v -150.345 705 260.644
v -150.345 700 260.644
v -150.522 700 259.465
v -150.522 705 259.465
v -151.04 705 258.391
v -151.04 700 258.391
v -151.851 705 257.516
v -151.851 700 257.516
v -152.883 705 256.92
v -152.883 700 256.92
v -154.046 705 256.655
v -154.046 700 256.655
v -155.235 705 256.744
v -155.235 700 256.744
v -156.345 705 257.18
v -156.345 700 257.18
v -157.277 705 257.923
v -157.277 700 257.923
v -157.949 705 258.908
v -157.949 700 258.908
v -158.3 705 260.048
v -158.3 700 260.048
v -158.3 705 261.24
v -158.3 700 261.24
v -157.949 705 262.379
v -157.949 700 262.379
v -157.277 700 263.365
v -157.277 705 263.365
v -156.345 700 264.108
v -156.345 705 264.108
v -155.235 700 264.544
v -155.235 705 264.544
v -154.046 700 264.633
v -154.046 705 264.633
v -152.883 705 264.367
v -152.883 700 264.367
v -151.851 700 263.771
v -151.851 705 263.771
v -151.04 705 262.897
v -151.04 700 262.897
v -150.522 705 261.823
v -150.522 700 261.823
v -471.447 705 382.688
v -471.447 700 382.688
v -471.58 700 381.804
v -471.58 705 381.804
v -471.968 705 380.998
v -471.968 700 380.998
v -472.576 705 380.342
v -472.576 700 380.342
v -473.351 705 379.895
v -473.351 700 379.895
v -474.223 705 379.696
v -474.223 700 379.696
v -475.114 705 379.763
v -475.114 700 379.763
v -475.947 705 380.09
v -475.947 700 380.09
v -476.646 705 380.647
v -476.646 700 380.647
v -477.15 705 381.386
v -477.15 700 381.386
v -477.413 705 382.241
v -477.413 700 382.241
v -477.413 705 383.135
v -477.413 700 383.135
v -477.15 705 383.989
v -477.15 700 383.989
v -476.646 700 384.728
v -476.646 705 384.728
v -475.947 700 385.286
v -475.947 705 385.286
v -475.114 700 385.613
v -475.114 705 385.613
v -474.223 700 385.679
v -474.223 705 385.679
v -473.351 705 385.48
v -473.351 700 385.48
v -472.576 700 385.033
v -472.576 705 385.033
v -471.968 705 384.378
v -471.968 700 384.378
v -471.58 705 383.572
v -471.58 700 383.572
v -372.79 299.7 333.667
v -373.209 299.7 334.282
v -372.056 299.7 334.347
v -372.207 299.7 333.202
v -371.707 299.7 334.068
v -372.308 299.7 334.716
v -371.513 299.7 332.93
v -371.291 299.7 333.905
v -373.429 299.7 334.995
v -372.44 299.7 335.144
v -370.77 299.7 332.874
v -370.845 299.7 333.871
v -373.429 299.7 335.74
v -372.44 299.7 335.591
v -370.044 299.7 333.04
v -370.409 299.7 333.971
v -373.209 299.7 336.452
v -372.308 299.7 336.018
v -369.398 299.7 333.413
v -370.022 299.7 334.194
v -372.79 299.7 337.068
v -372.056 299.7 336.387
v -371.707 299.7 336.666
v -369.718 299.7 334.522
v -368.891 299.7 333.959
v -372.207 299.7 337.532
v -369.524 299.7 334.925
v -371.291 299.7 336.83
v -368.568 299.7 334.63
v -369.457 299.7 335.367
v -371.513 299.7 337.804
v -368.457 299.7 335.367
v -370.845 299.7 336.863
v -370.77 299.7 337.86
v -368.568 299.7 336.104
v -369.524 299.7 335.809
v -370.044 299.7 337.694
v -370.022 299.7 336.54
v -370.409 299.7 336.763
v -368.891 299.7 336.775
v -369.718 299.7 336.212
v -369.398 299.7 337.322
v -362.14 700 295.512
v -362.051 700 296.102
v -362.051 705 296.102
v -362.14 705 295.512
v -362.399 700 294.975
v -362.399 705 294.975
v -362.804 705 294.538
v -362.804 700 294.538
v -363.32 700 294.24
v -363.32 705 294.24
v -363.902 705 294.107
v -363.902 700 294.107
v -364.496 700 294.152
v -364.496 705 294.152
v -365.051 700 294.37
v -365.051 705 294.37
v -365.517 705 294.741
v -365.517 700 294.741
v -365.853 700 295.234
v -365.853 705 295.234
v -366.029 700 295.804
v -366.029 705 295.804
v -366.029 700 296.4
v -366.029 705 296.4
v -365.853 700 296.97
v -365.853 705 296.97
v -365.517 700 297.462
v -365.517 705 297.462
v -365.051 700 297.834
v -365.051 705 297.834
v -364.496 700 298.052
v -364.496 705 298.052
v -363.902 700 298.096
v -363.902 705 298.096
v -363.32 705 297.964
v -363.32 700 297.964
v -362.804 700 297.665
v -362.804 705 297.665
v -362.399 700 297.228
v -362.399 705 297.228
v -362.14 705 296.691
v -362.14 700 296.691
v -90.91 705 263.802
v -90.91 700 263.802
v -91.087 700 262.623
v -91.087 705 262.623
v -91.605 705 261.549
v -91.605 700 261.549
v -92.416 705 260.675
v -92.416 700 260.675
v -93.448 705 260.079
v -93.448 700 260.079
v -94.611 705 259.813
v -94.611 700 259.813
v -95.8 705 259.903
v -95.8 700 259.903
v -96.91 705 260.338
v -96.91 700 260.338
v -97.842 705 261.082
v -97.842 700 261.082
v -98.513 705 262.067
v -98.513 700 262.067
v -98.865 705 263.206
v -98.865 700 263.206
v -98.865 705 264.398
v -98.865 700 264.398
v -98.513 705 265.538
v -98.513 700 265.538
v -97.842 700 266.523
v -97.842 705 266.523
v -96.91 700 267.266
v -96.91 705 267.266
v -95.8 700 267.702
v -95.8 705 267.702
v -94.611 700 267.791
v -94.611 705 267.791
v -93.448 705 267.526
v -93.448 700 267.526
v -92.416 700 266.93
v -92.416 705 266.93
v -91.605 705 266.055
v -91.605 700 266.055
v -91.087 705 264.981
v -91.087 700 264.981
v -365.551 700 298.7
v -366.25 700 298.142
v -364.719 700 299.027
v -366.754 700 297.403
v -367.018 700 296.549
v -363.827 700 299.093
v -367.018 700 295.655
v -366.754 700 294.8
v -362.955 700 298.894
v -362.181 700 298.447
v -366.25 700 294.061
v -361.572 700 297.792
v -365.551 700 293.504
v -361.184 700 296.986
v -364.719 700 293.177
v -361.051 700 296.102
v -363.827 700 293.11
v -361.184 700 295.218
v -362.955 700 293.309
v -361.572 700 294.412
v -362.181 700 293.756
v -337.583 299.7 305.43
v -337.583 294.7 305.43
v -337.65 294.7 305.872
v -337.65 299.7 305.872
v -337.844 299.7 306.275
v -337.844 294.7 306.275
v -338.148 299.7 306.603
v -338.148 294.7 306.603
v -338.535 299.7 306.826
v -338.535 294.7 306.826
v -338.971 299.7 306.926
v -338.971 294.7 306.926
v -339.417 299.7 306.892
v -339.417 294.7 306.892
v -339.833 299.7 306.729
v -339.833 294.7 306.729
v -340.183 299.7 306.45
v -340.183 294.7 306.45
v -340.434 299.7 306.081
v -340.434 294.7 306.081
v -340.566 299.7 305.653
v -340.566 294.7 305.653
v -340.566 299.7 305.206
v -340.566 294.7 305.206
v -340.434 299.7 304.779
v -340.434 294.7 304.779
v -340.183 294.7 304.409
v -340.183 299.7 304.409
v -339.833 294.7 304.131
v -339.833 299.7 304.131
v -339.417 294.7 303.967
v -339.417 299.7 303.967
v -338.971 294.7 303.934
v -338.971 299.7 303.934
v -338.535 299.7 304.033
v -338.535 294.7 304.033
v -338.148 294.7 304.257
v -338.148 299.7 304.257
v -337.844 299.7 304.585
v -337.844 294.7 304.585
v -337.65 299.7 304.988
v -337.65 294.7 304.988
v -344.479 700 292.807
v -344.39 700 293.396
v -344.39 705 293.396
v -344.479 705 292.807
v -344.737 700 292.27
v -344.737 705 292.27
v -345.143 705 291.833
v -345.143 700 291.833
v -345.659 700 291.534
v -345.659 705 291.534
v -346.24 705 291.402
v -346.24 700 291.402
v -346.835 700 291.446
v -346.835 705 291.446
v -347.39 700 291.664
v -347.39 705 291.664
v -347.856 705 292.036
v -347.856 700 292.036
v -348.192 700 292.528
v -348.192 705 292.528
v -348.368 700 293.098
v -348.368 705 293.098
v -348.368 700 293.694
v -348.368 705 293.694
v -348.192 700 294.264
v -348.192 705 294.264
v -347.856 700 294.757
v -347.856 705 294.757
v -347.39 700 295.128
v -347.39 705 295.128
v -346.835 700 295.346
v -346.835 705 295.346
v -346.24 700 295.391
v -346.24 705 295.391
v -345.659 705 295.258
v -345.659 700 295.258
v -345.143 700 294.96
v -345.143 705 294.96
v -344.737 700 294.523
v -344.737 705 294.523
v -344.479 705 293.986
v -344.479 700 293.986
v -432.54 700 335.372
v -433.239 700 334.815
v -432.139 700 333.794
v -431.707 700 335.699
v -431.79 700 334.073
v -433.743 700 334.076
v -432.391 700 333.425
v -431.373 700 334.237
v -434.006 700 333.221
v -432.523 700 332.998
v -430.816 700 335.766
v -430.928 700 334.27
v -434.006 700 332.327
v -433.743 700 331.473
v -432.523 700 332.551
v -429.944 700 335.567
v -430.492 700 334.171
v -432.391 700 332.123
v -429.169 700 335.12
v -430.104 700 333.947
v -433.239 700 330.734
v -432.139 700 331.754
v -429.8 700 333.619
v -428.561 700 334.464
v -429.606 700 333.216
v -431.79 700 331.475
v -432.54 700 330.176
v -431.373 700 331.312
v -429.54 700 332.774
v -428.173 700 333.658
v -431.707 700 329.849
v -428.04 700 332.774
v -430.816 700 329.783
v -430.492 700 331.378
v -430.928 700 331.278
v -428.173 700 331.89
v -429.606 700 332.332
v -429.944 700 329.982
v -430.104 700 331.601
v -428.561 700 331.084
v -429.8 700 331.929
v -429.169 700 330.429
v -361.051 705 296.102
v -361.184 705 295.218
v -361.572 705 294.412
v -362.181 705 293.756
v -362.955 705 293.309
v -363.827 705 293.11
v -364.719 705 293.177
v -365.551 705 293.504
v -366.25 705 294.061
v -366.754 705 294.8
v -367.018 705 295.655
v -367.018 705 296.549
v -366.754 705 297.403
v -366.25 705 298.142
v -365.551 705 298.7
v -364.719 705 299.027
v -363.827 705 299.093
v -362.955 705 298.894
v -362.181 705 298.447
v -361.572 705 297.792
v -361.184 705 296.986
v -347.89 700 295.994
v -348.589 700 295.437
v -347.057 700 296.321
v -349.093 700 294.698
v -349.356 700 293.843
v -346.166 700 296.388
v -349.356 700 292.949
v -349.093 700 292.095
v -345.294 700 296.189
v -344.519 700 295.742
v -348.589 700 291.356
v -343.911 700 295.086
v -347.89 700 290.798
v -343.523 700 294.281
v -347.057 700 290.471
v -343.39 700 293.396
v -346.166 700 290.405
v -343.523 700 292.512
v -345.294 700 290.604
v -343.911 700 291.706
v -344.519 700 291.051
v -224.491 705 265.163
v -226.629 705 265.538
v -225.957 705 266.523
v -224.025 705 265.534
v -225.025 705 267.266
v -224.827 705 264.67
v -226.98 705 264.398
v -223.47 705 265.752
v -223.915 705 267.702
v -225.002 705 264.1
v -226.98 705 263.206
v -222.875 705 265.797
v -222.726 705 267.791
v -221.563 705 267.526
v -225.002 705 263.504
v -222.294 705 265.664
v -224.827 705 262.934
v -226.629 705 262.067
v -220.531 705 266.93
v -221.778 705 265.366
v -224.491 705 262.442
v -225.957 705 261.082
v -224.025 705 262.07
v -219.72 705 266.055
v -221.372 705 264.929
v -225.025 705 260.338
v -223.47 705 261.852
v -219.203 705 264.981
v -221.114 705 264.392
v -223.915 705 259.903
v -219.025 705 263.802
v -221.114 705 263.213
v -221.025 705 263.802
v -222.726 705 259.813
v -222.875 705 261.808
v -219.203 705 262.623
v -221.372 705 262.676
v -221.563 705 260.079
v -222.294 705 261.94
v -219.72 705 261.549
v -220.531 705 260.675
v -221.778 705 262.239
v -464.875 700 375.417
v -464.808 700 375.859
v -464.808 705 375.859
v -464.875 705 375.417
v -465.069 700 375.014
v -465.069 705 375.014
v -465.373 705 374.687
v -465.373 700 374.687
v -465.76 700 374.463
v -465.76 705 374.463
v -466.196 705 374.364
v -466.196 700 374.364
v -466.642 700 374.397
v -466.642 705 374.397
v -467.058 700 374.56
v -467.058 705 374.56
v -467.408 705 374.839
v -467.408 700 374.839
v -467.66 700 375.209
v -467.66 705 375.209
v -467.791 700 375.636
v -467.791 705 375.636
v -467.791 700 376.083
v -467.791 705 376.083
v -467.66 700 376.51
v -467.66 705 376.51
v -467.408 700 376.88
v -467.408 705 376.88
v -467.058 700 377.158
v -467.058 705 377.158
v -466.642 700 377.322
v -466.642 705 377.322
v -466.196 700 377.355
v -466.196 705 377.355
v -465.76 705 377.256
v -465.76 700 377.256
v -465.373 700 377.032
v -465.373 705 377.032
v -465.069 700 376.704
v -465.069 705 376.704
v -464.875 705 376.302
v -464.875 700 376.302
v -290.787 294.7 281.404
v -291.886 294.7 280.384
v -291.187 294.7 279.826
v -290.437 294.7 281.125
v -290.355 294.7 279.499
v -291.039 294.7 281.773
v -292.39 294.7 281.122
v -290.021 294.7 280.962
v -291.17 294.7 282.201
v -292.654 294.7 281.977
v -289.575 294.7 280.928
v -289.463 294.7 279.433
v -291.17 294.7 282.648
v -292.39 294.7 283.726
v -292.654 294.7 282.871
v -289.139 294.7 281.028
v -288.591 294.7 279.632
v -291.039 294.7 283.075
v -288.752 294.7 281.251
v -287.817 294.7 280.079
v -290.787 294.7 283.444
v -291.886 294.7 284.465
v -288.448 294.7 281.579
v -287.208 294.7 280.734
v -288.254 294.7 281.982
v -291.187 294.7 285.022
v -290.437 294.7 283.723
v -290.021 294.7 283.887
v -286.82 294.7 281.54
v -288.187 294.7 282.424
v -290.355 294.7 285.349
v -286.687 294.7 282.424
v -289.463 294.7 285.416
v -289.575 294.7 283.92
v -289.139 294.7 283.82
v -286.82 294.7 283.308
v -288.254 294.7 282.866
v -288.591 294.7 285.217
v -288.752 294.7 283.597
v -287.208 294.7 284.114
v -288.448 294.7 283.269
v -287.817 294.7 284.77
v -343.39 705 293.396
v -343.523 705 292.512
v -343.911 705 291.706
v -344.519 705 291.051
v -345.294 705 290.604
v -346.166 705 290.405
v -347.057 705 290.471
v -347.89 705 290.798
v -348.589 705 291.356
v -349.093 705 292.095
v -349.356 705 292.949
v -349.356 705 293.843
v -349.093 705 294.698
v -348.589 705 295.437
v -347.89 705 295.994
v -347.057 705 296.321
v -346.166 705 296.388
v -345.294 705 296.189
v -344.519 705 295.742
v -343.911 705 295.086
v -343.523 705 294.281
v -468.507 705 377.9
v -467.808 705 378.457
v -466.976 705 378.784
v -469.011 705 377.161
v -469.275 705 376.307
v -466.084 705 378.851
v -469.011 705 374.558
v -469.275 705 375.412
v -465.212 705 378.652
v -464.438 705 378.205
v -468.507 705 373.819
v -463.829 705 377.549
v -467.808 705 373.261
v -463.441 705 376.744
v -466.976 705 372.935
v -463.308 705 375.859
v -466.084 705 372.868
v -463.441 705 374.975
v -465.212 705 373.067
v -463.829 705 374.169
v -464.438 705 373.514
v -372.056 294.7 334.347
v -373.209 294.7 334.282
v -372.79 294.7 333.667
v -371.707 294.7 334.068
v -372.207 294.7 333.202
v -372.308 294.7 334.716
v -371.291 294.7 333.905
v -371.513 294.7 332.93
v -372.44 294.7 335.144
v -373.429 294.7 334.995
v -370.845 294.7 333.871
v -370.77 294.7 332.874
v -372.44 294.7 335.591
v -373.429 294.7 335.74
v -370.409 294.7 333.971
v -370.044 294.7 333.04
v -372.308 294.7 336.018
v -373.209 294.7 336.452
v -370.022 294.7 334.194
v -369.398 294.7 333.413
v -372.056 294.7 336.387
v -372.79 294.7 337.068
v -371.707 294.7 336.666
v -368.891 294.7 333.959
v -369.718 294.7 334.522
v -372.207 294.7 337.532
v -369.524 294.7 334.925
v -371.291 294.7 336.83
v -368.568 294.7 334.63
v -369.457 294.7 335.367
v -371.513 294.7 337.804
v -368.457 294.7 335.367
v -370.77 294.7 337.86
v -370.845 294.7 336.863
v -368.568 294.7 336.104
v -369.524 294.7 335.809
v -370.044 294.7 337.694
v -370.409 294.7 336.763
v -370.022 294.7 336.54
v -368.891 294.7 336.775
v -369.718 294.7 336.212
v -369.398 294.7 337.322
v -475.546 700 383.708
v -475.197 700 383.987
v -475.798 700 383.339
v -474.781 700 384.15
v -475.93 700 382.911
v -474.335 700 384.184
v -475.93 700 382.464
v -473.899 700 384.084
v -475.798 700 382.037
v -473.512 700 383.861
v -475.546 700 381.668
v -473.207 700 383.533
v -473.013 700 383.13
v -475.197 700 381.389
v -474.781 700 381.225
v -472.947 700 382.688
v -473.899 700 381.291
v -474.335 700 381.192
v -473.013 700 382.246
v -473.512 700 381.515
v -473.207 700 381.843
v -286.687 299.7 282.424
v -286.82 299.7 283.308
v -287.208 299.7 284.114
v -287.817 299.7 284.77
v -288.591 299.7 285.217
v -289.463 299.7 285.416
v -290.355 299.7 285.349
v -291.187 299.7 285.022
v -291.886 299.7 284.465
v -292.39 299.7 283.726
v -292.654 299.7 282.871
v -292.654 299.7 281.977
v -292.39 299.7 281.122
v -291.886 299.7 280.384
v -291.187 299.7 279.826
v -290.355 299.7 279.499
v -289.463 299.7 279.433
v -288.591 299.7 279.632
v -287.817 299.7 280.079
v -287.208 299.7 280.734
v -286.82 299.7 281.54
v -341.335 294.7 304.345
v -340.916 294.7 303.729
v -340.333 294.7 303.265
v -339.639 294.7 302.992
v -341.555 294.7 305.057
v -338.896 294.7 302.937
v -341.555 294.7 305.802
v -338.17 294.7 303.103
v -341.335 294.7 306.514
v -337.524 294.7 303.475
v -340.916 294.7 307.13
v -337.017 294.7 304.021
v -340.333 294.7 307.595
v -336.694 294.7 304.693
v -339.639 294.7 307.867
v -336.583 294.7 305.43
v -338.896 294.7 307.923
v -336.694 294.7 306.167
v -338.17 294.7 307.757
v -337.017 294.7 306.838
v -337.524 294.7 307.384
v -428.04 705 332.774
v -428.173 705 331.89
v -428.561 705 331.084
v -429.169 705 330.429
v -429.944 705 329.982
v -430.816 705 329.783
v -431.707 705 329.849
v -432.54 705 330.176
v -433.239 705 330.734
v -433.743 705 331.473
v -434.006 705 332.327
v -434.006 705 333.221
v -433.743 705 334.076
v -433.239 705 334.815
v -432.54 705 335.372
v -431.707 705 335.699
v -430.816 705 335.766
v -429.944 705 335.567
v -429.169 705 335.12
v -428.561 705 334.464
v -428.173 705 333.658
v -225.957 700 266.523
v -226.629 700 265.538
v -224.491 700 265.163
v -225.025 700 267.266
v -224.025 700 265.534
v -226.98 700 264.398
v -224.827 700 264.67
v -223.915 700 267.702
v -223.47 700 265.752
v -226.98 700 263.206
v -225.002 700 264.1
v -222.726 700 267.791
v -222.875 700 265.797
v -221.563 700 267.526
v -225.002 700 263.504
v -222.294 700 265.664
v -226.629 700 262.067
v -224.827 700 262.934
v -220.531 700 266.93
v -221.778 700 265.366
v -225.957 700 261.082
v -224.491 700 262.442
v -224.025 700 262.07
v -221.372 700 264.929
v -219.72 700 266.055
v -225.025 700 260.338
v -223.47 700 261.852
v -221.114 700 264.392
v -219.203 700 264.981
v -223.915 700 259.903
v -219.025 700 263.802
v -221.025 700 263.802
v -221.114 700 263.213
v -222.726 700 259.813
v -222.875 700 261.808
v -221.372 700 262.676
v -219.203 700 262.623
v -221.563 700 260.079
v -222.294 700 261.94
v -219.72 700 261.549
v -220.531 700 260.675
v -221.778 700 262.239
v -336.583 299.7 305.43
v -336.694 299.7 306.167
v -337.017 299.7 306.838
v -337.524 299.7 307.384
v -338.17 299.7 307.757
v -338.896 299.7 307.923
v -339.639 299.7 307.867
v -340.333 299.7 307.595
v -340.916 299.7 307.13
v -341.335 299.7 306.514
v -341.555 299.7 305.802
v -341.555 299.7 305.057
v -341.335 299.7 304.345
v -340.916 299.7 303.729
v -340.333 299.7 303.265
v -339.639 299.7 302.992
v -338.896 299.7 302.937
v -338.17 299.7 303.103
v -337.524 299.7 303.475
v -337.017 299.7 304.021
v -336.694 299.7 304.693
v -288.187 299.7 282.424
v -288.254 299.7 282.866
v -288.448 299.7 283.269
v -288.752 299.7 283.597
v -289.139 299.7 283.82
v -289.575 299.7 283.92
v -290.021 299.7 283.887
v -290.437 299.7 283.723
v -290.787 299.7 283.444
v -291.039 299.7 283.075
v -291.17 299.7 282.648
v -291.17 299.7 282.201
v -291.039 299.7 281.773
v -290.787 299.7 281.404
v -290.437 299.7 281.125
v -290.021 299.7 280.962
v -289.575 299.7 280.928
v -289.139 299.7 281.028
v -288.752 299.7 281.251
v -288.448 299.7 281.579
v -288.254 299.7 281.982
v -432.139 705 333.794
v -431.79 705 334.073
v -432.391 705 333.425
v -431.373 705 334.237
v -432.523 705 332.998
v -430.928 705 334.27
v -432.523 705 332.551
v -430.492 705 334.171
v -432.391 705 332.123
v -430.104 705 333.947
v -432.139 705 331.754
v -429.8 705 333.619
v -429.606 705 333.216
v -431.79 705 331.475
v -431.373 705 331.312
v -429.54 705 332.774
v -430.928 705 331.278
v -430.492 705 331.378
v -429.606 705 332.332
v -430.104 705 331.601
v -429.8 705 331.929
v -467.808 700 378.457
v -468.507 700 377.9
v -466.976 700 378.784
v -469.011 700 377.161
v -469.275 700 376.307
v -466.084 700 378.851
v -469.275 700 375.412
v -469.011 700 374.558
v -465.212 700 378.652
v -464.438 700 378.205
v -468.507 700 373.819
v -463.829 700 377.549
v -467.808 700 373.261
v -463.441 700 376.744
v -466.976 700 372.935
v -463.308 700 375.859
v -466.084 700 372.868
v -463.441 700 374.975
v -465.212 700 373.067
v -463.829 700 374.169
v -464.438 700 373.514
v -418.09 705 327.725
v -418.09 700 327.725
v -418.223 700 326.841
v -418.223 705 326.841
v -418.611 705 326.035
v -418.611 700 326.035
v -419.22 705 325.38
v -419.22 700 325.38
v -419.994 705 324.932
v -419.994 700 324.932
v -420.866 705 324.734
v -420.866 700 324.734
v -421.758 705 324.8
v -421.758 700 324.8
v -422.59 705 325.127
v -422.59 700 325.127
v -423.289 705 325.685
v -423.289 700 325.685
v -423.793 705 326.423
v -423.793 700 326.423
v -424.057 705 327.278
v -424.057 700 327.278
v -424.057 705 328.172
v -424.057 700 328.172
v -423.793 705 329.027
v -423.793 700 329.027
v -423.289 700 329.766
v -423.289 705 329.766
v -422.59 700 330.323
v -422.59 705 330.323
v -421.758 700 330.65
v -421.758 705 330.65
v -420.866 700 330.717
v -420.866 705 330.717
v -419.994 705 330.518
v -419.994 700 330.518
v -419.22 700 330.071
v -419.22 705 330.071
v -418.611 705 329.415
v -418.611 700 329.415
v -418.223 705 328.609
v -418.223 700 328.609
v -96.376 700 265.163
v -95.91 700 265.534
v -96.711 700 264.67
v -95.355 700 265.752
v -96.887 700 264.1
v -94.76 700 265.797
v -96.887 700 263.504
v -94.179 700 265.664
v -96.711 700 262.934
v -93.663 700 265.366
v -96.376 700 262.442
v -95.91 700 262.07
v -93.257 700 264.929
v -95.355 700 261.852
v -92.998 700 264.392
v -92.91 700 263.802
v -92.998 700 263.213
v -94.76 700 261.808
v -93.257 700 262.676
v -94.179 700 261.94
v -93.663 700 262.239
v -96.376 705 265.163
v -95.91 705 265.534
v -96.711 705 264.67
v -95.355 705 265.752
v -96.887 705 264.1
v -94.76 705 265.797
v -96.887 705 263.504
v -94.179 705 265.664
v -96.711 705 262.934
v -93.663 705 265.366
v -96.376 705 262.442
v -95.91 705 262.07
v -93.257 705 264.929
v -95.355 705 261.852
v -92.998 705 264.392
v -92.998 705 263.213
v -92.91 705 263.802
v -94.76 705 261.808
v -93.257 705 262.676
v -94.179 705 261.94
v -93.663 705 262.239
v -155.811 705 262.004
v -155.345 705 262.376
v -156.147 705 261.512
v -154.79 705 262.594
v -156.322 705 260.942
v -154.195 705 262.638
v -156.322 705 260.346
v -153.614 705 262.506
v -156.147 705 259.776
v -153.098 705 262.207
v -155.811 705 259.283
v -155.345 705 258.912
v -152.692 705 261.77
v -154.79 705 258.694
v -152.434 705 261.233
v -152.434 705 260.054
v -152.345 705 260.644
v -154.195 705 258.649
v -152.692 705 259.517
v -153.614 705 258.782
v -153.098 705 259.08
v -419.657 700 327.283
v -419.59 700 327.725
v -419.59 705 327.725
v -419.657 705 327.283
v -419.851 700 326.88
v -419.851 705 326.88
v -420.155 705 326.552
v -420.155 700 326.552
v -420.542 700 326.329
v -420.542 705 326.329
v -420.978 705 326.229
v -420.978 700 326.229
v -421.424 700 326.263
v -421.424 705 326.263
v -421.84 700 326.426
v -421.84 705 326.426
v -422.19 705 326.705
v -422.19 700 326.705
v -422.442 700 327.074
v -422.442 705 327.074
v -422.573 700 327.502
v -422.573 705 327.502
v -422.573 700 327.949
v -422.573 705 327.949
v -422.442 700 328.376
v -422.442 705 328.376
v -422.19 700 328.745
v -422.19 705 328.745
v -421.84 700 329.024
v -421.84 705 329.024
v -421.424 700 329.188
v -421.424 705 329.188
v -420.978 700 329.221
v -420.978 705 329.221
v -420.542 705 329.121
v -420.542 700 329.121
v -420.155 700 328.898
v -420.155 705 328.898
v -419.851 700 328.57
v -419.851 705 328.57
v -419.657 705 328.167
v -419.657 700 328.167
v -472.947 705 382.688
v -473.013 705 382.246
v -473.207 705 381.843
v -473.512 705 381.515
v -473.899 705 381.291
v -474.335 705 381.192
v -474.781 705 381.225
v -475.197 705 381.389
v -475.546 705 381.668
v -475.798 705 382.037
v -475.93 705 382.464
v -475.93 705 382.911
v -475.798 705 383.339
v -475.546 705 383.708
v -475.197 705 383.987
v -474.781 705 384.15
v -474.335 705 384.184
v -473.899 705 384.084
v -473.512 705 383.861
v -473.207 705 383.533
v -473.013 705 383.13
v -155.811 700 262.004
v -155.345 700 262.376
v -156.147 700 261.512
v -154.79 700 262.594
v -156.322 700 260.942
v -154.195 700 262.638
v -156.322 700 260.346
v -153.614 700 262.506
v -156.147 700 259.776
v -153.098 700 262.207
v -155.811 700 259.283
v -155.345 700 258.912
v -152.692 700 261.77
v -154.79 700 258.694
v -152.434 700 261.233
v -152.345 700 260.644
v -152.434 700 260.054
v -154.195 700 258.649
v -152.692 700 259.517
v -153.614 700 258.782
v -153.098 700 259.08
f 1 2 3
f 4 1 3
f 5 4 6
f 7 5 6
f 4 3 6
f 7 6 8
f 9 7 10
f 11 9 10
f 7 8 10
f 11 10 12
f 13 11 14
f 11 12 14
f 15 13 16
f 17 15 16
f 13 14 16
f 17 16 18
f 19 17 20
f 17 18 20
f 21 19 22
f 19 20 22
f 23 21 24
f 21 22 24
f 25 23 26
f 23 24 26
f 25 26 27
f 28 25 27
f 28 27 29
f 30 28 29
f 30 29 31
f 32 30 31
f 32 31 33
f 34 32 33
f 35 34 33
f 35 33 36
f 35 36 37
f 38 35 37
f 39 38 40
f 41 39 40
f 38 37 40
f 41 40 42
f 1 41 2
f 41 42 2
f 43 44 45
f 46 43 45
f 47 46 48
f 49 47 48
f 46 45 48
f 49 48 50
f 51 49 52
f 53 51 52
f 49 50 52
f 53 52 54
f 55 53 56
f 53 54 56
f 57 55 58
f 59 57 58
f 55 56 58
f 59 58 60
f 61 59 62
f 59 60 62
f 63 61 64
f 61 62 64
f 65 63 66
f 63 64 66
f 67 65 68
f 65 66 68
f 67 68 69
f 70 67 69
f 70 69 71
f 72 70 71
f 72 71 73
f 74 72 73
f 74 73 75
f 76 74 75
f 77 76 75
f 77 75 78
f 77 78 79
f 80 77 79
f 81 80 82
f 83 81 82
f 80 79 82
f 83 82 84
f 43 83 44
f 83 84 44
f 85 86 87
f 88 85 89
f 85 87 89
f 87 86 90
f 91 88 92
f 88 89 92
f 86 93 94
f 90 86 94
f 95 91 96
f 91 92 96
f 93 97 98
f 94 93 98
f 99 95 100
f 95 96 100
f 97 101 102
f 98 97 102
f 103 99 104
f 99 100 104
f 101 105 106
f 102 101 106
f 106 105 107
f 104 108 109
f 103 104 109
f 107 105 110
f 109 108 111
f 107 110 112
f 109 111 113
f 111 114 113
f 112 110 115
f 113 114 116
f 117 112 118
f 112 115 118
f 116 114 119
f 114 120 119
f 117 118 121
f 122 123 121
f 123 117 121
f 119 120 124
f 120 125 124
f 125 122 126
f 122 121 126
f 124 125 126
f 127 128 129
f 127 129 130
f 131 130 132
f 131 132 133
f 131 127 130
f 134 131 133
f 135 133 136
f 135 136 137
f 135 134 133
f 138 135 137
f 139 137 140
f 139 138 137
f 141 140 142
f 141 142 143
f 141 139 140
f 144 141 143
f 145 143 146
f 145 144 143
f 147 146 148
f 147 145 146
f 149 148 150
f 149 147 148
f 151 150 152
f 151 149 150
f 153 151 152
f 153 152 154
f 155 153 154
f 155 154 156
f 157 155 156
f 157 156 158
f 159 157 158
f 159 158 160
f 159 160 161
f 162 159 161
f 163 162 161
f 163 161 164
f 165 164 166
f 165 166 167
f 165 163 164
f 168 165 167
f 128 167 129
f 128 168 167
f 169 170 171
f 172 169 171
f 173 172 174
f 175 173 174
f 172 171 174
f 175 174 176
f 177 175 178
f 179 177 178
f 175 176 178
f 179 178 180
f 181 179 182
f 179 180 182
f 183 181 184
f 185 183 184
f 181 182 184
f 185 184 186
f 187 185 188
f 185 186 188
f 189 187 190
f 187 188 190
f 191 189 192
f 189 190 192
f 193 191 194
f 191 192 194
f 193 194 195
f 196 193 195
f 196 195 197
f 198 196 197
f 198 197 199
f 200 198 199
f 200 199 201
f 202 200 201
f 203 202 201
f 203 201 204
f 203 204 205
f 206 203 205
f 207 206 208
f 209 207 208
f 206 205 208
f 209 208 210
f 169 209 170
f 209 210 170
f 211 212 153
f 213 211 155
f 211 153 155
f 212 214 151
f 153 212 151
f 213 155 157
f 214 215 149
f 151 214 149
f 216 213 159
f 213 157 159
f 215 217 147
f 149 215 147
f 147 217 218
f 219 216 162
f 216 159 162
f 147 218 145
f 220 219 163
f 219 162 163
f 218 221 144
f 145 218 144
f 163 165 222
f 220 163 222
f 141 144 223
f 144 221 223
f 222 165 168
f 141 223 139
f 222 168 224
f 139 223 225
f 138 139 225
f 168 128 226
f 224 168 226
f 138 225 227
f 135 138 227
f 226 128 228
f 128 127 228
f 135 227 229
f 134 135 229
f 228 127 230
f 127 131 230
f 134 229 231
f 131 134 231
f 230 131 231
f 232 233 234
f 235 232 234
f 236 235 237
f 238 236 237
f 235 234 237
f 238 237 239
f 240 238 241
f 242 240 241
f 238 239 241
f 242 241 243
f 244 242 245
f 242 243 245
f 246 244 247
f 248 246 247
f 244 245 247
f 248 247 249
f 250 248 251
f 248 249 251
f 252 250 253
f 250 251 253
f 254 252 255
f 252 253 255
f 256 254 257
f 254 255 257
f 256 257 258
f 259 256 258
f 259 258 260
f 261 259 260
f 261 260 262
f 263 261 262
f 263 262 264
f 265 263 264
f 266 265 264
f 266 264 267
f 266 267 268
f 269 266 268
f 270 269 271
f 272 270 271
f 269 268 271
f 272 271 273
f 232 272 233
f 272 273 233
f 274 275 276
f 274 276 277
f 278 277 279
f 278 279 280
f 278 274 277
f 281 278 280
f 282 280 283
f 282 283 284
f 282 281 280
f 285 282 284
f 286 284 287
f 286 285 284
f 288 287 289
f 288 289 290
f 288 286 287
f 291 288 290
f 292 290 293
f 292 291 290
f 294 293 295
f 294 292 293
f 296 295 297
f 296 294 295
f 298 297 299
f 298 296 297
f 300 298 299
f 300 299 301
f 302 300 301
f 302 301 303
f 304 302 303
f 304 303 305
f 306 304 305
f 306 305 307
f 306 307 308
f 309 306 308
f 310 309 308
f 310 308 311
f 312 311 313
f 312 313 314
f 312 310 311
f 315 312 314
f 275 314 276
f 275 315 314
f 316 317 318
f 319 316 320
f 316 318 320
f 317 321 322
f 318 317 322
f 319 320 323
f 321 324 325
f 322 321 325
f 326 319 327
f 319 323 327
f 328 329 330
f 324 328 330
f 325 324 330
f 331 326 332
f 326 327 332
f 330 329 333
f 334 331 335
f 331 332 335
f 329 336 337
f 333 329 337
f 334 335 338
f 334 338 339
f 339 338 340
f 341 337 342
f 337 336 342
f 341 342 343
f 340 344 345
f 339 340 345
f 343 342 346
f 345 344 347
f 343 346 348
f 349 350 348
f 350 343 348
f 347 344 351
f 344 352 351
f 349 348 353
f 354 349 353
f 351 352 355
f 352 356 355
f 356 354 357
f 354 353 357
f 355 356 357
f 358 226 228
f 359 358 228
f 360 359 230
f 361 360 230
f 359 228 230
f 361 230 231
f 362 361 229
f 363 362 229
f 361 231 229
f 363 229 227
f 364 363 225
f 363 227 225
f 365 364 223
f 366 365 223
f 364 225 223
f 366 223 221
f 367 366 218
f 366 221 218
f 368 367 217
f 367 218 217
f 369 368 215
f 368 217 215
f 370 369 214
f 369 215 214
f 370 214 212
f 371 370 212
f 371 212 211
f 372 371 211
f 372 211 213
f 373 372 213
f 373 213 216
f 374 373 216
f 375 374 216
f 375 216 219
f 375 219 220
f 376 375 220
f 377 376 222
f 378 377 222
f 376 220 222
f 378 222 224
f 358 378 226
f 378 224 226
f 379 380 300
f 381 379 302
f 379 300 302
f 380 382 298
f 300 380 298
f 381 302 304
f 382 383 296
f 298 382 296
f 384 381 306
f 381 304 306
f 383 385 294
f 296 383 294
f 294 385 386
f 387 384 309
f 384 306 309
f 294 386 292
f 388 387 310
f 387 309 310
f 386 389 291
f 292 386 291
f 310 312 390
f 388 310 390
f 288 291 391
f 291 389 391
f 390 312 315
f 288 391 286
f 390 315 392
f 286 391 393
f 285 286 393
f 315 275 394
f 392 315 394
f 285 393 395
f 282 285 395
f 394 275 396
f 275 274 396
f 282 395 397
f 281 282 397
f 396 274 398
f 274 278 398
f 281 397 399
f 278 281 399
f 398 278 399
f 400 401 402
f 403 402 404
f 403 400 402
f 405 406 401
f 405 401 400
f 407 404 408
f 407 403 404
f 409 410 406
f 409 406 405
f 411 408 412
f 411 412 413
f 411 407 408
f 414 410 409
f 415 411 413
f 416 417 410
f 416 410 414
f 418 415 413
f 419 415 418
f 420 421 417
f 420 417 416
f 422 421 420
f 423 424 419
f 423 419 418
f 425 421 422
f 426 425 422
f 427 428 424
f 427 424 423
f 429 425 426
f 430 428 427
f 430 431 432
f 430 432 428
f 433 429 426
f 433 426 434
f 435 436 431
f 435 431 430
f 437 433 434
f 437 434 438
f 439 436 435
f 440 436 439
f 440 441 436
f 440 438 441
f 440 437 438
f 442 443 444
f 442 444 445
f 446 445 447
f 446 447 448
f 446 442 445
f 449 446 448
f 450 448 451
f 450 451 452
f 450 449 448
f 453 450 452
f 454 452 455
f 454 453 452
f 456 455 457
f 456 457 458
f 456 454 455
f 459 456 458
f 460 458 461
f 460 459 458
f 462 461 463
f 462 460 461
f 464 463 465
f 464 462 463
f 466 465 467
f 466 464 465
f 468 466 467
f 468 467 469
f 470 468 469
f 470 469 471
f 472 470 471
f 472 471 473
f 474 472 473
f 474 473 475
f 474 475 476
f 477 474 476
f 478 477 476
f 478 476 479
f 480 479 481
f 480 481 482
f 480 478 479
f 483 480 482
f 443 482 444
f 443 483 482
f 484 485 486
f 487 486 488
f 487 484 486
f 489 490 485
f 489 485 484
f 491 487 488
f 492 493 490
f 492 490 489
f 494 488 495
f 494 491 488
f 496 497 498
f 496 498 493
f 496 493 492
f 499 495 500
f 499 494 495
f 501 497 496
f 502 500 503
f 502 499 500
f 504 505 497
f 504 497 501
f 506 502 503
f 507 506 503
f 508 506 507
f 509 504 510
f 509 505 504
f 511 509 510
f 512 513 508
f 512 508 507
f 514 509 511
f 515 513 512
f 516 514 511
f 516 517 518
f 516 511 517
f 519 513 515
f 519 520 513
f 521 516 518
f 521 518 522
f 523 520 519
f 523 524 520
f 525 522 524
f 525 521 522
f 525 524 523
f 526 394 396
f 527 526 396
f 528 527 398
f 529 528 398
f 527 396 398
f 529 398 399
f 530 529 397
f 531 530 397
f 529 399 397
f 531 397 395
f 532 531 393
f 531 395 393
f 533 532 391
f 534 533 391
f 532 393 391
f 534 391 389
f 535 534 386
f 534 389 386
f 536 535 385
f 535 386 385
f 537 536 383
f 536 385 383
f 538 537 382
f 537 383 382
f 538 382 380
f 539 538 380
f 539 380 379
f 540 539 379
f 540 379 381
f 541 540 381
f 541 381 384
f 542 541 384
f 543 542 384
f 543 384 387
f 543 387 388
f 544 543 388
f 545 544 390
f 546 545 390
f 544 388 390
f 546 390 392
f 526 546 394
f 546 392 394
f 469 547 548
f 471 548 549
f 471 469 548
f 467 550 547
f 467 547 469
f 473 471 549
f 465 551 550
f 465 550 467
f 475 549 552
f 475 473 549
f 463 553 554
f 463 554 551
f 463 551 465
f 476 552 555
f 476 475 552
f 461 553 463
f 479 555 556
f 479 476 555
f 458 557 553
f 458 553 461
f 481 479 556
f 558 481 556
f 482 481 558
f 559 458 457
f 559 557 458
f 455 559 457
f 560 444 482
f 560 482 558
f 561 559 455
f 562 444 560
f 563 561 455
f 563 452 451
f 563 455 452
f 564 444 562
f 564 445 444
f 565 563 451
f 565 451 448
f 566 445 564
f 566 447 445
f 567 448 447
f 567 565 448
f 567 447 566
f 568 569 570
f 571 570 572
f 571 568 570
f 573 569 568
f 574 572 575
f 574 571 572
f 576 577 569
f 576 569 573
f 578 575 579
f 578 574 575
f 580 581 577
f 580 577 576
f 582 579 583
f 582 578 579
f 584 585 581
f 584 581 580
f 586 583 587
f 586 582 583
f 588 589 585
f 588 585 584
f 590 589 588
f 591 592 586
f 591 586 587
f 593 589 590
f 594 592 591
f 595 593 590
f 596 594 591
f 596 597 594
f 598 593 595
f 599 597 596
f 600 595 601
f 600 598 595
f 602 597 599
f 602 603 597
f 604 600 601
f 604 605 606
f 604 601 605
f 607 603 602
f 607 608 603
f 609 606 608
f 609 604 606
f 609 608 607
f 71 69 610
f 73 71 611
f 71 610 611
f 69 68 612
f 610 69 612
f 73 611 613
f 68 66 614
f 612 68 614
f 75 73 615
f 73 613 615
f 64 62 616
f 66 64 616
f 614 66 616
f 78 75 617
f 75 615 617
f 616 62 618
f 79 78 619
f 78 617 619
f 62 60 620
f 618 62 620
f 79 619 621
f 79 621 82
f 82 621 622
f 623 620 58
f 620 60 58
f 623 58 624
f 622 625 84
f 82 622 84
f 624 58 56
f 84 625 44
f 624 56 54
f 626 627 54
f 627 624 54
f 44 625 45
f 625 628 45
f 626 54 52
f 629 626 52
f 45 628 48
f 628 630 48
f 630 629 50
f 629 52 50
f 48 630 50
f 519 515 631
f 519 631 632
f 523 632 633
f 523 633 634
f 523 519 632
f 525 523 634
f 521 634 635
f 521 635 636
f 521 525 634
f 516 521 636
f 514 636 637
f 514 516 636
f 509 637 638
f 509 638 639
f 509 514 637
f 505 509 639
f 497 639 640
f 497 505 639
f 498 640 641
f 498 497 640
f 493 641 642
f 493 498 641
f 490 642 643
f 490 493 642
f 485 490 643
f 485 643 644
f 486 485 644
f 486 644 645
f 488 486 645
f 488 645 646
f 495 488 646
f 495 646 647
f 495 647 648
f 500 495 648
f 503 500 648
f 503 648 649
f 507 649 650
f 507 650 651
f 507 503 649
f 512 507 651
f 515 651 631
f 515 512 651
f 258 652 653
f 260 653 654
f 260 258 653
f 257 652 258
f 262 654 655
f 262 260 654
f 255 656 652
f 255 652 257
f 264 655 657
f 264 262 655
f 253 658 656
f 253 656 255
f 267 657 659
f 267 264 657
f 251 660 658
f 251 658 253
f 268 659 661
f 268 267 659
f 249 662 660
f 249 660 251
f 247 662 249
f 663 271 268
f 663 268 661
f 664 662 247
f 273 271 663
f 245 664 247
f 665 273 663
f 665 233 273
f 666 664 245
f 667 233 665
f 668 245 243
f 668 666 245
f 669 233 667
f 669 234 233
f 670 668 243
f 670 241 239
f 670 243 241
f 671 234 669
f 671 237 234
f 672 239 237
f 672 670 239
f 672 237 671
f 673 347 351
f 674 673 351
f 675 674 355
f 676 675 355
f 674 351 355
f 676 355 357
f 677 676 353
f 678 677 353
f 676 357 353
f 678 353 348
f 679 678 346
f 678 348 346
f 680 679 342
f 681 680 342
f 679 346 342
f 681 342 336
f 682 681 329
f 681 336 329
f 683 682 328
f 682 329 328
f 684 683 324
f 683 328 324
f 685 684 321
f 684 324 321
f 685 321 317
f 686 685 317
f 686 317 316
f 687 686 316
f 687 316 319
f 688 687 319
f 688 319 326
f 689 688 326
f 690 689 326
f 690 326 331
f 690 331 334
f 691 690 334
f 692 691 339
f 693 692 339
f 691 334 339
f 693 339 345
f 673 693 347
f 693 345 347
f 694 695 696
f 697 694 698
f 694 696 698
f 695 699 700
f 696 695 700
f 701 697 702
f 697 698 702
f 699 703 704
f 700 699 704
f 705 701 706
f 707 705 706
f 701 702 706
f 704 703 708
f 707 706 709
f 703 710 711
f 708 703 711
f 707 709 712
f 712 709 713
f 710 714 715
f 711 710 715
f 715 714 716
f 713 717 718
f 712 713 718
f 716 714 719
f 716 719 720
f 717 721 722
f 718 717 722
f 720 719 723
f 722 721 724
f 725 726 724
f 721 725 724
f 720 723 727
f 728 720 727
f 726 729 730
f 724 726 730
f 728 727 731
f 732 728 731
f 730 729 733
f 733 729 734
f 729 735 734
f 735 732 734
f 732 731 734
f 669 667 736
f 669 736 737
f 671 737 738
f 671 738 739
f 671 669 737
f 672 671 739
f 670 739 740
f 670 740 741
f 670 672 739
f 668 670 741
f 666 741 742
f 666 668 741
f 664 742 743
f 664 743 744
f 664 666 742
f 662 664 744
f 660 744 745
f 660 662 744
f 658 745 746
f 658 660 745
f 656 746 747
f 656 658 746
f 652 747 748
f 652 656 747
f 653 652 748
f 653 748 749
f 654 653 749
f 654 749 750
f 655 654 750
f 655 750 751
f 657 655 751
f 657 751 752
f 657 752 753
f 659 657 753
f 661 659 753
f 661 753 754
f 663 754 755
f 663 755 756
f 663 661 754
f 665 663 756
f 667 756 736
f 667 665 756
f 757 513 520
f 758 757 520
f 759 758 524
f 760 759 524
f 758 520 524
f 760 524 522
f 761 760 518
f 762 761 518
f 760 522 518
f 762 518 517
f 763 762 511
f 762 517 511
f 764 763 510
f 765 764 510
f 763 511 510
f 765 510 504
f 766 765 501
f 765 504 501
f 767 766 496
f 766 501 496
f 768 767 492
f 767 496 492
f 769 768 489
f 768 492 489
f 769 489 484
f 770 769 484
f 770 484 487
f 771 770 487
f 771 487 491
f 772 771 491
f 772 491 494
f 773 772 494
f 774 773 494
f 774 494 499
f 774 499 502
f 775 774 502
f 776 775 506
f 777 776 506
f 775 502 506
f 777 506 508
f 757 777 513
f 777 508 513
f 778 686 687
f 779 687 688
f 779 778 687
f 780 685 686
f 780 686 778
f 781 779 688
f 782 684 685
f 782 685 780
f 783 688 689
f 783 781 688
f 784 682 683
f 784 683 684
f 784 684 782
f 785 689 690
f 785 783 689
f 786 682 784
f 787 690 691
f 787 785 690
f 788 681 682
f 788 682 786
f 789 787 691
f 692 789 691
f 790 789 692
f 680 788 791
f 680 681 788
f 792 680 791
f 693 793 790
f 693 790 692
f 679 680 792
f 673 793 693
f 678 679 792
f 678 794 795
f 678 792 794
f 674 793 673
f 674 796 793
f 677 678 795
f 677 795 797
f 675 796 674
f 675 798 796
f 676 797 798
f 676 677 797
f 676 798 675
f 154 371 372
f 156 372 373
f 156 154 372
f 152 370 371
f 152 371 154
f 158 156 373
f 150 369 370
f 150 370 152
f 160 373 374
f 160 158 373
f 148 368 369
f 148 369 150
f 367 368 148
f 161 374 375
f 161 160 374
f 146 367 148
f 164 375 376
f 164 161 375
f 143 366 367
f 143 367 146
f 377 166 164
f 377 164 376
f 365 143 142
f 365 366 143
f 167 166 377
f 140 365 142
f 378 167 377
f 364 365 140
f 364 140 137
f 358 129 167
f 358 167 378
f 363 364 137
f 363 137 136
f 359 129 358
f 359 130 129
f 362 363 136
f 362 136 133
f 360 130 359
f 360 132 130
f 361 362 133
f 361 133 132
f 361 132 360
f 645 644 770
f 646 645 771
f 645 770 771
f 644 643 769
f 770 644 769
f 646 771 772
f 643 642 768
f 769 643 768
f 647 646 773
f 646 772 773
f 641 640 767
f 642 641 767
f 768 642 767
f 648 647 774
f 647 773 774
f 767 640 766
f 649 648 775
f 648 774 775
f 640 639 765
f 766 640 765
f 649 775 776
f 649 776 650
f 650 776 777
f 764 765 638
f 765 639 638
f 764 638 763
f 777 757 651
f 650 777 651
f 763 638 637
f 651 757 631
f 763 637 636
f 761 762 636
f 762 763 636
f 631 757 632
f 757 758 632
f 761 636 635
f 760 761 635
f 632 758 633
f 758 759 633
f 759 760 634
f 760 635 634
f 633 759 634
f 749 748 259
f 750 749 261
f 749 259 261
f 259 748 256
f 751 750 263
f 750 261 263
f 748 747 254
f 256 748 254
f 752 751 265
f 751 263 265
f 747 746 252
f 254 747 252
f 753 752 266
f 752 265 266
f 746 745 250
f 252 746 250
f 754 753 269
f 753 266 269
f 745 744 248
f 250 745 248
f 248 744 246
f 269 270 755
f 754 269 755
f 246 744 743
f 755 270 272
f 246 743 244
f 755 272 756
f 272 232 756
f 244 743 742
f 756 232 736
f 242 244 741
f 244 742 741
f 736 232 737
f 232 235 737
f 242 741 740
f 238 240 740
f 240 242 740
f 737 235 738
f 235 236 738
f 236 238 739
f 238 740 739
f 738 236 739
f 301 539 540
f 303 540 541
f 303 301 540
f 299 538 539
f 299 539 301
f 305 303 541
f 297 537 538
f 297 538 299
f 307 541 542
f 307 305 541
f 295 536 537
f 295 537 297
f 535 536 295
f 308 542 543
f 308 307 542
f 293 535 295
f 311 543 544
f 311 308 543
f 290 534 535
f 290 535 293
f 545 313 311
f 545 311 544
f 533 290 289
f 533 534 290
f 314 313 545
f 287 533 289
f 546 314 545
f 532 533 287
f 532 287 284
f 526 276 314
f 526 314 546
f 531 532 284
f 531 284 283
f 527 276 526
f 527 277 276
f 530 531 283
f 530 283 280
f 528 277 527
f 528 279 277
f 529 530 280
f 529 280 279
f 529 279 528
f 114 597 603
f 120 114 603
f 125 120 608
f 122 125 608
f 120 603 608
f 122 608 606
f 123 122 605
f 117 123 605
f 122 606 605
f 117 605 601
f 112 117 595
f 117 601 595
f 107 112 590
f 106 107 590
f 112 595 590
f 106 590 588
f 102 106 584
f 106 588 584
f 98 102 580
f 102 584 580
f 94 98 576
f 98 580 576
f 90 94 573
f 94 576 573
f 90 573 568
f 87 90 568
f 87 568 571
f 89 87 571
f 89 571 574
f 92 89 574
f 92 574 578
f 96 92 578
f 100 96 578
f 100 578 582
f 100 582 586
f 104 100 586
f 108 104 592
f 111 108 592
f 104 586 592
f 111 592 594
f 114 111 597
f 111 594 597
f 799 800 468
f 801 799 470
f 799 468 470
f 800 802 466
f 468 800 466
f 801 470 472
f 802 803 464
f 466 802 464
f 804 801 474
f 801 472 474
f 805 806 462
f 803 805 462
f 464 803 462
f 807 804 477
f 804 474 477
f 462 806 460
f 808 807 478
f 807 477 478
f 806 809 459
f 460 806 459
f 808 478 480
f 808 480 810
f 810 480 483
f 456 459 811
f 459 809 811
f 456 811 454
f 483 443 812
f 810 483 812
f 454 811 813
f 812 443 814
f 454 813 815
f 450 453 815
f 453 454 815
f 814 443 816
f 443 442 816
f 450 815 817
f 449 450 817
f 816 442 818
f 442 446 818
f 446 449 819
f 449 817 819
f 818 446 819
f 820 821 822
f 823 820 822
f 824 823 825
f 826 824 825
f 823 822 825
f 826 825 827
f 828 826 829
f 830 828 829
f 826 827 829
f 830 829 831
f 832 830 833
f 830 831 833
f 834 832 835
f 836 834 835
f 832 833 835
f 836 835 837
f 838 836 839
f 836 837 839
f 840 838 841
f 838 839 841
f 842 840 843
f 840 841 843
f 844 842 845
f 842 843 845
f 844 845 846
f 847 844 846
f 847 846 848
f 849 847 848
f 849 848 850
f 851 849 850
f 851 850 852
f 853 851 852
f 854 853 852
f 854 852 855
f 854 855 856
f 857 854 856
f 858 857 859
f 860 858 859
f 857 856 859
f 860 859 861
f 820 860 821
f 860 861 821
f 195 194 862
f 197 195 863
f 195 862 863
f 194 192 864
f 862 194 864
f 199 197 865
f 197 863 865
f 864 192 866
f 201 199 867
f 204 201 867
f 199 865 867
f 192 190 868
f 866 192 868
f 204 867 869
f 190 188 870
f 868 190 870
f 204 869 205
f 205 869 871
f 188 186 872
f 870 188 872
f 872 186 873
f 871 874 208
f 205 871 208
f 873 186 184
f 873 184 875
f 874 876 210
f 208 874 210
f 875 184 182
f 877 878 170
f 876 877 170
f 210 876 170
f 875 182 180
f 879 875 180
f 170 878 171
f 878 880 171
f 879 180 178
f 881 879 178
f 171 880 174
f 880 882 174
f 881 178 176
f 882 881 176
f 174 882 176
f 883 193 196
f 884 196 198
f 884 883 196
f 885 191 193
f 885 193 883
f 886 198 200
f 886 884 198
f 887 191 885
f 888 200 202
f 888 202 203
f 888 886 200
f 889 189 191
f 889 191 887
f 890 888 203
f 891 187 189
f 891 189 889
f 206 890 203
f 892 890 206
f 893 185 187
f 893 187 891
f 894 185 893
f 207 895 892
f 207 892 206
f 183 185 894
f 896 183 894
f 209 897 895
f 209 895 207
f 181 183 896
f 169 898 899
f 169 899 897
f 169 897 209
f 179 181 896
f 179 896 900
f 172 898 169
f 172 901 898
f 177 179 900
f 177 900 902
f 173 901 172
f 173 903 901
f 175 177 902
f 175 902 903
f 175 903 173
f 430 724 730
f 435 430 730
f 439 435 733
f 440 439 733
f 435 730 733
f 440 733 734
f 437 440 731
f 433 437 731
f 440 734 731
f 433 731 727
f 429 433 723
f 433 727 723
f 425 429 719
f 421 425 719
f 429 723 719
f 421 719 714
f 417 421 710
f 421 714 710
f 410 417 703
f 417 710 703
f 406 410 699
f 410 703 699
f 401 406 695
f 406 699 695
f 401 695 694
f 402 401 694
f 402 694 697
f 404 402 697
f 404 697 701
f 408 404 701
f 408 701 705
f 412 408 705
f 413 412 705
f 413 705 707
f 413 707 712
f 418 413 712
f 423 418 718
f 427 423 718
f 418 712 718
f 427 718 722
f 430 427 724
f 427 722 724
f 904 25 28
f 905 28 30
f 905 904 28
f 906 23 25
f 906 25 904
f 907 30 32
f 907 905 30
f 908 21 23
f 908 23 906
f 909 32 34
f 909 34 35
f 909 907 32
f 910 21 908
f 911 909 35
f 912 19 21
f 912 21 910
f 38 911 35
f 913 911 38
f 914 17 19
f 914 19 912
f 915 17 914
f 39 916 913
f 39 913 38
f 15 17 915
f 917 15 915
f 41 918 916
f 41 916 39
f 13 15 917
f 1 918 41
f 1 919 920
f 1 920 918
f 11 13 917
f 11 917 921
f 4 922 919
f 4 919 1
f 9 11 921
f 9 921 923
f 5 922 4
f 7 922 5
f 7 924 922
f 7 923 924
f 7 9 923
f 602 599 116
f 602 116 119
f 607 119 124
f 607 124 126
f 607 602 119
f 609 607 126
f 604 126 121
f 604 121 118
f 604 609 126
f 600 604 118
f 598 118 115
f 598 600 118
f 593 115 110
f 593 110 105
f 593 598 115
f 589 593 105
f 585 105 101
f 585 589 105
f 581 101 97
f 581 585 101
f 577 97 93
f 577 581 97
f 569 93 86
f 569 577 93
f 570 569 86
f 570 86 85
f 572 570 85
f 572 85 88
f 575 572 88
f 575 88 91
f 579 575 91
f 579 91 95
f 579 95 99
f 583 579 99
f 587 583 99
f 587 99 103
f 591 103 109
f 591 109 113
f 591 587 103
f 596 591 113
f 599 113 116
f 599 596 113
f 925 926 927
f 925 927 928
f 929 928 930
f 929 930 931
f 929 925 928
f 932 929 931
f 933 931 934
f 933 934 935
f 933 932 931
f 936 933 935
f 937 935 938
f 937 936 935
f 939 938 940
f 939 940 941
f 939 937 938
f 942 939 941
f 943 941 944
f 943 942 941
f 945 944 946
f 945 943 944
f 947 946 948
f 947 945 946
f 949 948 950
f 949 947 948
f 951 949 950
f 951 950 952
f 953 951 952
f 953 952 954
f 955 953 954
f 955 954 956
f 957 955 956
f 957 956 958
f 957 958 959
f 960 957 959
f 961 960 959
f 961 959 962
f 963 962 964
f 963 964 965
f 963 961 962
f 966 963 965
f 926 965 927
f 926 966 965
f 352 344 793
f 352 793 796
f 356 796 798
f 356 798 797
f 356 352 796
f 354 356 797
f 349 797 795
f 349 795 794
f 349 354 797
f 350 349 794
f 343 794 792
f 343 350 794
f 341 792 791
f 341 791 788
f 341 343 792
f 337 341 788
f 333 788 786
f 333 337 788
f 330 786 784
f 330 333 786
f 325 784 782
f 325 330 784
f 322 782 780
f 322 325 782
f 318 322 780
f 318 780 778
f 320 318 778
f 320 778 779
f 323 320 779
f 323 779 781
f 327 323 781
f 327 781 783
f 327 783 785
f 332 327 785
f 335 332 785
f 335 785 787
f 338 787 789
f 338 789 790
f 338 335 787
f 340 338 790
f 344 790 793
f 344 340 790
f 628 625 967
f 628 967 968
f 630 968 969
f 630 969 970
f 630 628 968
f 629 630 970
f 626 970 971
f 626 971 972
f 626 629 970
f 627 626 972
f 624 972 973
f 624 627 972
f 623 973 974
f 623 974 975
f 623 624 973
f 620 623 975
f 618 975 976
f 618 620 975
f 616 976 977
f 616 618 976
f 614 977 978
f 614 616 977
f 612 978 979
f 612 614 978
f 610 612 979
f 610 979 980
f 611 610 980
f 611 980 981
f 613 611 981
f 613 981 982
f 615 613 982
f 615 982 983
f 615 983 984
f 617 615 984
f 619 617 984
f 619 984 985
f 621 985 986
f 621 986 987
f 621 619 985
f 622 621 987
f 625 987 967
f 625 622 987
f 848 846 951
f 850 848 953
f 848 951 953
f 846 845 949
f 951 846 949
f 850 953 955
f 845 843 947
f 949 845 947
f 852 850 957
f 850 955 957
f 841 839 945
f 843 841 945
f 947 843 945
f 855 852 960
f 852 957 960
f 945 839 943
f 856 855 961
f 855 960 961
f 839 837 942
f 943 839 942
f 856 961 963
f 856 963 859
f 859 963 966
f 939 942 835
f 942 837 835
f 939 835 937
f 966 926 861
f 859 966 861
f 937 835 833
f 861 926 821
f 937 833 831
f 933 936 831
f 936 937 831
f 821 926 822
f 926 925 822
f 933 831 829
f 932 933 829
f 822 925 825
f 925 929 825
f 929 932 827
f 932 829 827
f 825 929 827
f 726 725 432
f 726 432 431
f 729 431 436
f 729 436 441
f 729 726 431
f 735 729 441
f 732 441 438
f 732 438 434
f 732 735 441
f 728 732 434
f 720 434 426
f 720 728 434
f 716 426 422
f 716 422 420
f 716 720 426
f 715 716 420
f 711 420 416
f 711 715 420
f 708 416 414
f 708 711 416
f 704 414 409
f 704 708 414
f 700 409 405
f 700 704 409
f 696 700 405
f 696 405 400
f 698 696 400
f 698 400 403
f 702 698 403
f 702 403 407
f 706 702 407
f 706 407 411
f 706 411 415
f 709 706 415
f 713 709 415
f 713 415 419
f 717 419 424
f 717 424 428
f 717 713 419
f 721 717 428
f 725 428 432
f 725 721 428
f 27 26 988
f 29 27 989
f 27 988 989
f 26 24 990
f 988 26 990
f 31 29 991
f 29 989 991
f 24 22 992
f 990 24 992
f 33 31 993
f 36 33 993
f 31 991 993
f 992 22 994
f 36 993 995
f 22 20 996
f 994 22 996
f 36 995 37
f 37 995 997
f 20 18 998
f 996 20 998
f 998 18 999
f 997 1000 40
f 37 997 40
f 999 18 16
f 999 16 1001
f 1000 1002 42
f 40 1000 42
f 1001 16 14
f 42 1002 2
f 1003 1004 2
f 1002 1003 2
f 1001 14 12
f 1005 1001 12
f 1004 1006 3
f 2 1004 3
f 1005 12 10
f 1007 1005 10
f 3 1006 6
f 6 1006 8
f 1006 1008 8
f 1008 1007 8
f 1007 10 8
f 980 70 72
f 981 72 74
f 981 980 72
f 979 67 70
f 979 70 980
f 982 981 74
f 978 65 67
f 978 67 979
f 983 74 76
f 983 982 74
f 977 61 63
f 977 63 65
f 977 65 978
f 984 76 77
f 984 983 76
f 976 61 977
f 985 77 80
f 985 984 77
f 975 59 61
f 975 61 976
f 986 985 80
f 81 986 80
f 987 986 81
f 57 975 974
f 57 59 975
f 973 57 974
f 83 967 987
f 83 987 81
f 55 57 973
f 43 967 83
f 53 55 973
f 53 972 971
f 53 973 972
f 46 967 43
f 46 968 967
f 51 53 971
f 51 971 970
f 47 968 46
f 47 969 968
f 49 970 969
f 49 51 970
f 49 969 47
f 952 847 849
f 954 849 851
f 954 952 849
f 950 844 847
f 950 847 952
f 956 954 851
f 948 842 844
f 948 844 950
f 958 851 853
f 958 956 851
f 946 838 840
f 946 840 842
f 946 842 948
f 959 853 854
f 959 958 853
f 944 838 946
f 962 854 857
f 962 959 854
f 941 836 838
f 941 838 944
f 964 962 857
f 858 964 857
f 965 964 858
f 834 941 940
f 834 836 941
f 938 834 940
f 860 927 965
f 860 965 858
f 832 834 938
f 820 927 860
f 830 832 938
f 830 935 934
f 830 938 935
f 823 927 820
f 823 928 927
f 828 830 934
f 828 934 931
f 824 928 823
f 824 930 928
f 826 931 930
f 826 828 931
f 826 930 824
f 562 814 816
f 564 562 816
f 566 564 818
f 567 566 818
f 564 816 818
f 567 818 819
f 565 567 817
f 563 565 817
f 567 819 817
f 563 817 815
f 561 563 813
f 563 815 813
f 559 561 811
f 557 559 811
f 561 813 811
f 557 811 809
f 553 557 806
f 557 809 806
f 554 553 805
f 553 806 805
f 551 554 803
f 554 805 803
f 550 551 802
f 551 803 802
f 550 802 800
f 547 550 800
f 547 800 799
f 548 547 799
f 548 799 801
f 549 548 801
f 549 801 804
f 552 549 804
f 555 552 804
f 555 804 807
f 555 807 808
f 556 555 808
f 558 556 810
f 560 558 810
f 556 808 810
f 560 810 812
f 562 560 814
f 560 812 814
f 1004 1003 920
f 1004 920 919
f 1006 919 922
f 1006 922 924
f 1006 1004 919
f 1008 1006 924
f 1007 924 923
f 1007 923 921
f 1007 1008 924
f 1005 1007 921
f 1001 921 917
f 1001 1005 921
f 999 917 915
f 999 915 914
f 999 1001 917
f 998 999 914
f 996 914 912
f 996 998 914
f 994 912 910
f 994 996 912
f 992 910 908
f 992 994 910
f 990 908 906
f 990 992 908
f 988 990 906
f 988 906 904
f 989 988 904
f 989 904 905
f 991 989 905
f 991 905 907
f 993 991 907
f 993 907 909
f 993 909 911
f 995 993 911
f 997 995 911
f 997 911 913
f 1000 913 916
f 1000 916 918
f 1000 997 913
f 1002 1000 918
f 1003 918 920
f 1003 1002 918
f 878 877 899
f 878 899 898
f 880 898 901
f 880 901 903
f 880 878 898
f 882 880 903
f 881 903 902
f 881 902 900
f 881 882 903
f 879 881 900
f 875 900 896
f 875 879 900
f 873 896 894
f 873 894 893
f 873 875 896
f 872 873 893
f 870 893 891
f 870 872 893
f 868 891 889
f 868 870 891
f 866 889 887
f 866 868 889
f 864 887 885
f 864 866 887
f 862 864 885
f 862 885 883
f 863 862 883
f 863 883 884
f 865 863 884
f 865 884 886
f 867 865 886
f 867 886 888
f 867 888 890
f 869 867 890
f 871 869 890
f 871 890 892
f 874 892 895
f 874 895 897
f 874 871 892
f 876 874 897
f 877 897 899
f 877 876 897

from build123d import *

# Parameters (mm, degrees)
SZKIC1_R                      = 3
SZKIC1_R_2                    = 1.5
DODANIE_WYCI_GNI_CIE1_DEPTH   = 5
DODANIE_WYCI_GNI_CIE1_2_DEPTH = 5
DODANIE_WYCI_GNI_CIE1_3_DEPTH = 5
DODANIE_WYCI_GNI_CIE1_4_DEPTH = 5
SZKIC1_R_3                    = 2
DODANIE_WYCI_GNI_CIE1_5_DEPTH = 5
DODANIE_WYCI_GNI_CIE1_6_DEPTH = 5
SZKIC1_R_4                    = 4
DODANIE_WYCI_GNI_CIE1_7_DEPTH = 5
DODANIE_WYCI_GNI_CIE1_8_DEPTH = 5
DODANIE_WYCI_GNI_CIE1_9_DEPTH = 5
SZKIC2_R                      = 2.5
SZKIC2_R_2                    = 1.5
DODANIE_WYCI_GNI_CIE2_DEPTH   = 5
SZKIC2_R_3                    = 3
DODANIE_WYCI_GNI_CIE2_2_DEPTH = 5
DODANIE_WYCI_GNI_CIE2_3_DEPTH = 5


with BuildPart() as part:
    # Szkic1 → Dodanie-wyciągnięcie1 (new body)
    with BuildSketch(Plane(origin=(0, 700, 0), x_dir=(1, 0, 0), z_dir=(0, 1, 0))):
        with Locations((-474.446759549, -382.68779999)):
            Circle(SZKIC1_R)
        with Locations((-474.446759549, -382.68779999)):
            Circle(SZKIC1_R_2, mode=Mode.SUBTRACT)
    extrude(amount=DODANIE_WYCI_GNI_CIE1_DEPTH)


with BuildPart() as body_2:
    # Szkic1 → Dodanie-wyci_gni_cie1 2 (new body)
    with BuildSketch(Plane(origin=(0, 700, 0), x_dir=(1, 0, 0), z_dir=(0, 1, 0))):
        with Locations((-466.308050674, -375.85941501)):
            Circle(SZKIC1_R)
        with Locations((-466.308050674, -375.85941501)):
            Circle(SZKIC1_R_2, mode=Mode.SUBTRACT)
    extrude(amount=DODANIE_WYCI_GNI_CIE1_2_DEPTH)


with BuildPart() as body_3:
    # Szkic1 → Dodanie-wyci_gni_cie1 3 (new body)
    with BuildSketch(Plane(origin=(0, 700, 0), x_dir=(1, 0, 0), z_dir=(0, 1, 0))):
        with Locations((-431.039698402, -332.774189517)):
            Circle(SZKIC1_R)
        with Locations((-431.039698402, -332.774189517)):
            Circle(SZKIC1_R_2, mode=Mode.SUBTRACT)
    extrude(amount=DODANIE_WYCI_GNI_CIE1_3_DEPTH)


with BuildPart() as body_4:
    # Szkic1 → Dodanie-wyci_gni_cie1 4 (new body)
    with BuildSketch(Plane(origin=(0, 700, 0), x_dir=(1, 0, 0), z_dir=(0, 1, 0))):
        with Locations((-421.090050281, -327.725114352)):
            Circle(SZKIC1_R)
        with Locations((-421.090050281, -327.725114352)):
            Circle(SZKIC1_R_2, mode=Mode.SUBTRACT)
    extrude(amount=DODANIE_WYCI_GNI_CIE1_4_DEPTH)


with BuildPart() as body_5:
    # Szkic1 → Dodanie-wyci_gni_cie1 5 (new body)
    with BuildSketch(Plane(origin=(0, 700, 0), x_dir=(1, 0, 0), z_dir=(0, 1, 0))):
        with Locations((-364.051137421, -296.101801859)):
            Circle(SZKIC1_R)
        with Locations((-364.051137421, -296.101801859)):
            Circle(SZKIC1_R_3, mode=Mode.SUBTRACT)
    extrude(amount=DODANIE_WYCI_GNI_CIE1_5_DEPTH)


with BuildPart() as body_6:
    # Szkic1 → Dodanie-wyci_gni_cie1 6 (new body)
    with BuildSketch(Plane(origin=(0, 700, 0), x_dir=(1, 0, 0), z_dir=(0, 1, 0))):
        with Locations((-346.389872513, -293.396246383)):
            Circle(SZKIC1_R)
        with Locations((-346.389872513, -293.396246383)):
            Circle(SZKIC1_R_3, mode=Mode.SUBTRACT)
    extrude(amount=DODANIE_WYCI_GNI_CIE1_6_DEPTH)


with BuildPart() as body_7:
    # Szkic1 → Dodanie-wyci_gni_cie1 7 (new body)
    with BuildSketch(Plane(origin=(0, 700, 0), x_dir=(1, 0, 0), z_dir=(0, 1, 0))):
        with Locations((-223.024834581, -263.802212936)):
            Circle(SZKIC1_R_4)
        with Locations((-223.024834581, -263.802212936)):
            Circle(SZKIC1_R_3, mode=Mode.SUBTRACT)
    extrude(amount=DODANIE_WYCI_GNI_CIE1_7_DEPTH)


with BuildPart() as body_8:
    # Szkic1 → Dodanie-wyci_gni_cie1 8 (new body)
    with BuildSketch(Plane(origin=(0, 700, 0), x_dir=(1, 0, 0), z_dir=(0, 1, 0))):
        with Locations((-154.344703344, -260.643821632)):
            Circle(SZKIC1_R_4)
        with Locations((-154.344703344, -260.643821632)):
            Circle(SZKIC1_R_3, mode=Mode.SUBTRACT)
    extrude(amount=DODANIE_WYCI_GNI_CIE1_8_DEPTH)


with BuildPart() as body_9:
    # Szkic1 → Dodanie-wyci_gni_cie1 9 (new body)
    with BuildSketch(Plane(origin=(0, 700, 0), x_dir=(1, 0, 0), z_dir=(0, 1, 0))):
        with Locations((-94.909521544, -263.802212936)):
            Circle(SZKIC1_R_4)
        with Locations((-94.909521544, -263.802212936)):
            Circle(SZKIC1_R_3, mode=Mode.SUBTRACT)
    extrude(amount=DODANIE_WYCI_GNI_CIE1_9_DEPTH)


with BuildPart() as body_10:
    # Szkic2 → Dodanie-wyciągnięcie2 (new body)
    with BuildSketch(Plane.XZ.offset(-294.7)):
        with Locations((-370.956911026, 335.367132453)):
            Circle(SZKIC2_R)
        with Locations((-370.956911026, 335.367132453)):
            Circle(SZKIC2_R_2, mode=Mode.SUBTRACT)
    extrude(amount=-DODANIE_WYCI_GNI_CIE2_DEPTH)


with BuildPart() as body_11:
    # Szkic2 → Dodanie-wyci_gni_cie2 2 (new body)
    with BuildSketch(Plane.XZ.offset(-294.7)):
        with Locations((-289.68705591, 282.424125213)):
            Circle(SZKIC2_R_3)
        with Locations((-289.68705591, 282.424125213)):
            Circle(SZKIC2_R_2, mode=Mode.SUBTRACT)
    extrude(amount=-DODANIE_WYCI_GNI_CIE2_2_DEPTH)


with BuildPart() as body_12:
    # Szkic2 → Dodanie-wyci_gni_cie2 3 (new body)
    with BuildSketch(Plane.XZ.offset(-294.7)):
        with Locations((-339.082998521, 305.429754445)):
            Circle(SZKIC2_R)
        with Locations((-339.082998521, 305.429754445)):
            Circle(SZKIC2_R_2, mode=Mode.SUBTRACT)
    extrude(amount=-DODANIE_WYCI_GNI_CIE2_3_DEPTH)


solid = Compound([part.part, body_2.part, body_3.part, body_4.part, body_5.part, body_6.part, body_7.part, body_8.part, body_9.part, body_10.part, body_11.part, body_12.part])
